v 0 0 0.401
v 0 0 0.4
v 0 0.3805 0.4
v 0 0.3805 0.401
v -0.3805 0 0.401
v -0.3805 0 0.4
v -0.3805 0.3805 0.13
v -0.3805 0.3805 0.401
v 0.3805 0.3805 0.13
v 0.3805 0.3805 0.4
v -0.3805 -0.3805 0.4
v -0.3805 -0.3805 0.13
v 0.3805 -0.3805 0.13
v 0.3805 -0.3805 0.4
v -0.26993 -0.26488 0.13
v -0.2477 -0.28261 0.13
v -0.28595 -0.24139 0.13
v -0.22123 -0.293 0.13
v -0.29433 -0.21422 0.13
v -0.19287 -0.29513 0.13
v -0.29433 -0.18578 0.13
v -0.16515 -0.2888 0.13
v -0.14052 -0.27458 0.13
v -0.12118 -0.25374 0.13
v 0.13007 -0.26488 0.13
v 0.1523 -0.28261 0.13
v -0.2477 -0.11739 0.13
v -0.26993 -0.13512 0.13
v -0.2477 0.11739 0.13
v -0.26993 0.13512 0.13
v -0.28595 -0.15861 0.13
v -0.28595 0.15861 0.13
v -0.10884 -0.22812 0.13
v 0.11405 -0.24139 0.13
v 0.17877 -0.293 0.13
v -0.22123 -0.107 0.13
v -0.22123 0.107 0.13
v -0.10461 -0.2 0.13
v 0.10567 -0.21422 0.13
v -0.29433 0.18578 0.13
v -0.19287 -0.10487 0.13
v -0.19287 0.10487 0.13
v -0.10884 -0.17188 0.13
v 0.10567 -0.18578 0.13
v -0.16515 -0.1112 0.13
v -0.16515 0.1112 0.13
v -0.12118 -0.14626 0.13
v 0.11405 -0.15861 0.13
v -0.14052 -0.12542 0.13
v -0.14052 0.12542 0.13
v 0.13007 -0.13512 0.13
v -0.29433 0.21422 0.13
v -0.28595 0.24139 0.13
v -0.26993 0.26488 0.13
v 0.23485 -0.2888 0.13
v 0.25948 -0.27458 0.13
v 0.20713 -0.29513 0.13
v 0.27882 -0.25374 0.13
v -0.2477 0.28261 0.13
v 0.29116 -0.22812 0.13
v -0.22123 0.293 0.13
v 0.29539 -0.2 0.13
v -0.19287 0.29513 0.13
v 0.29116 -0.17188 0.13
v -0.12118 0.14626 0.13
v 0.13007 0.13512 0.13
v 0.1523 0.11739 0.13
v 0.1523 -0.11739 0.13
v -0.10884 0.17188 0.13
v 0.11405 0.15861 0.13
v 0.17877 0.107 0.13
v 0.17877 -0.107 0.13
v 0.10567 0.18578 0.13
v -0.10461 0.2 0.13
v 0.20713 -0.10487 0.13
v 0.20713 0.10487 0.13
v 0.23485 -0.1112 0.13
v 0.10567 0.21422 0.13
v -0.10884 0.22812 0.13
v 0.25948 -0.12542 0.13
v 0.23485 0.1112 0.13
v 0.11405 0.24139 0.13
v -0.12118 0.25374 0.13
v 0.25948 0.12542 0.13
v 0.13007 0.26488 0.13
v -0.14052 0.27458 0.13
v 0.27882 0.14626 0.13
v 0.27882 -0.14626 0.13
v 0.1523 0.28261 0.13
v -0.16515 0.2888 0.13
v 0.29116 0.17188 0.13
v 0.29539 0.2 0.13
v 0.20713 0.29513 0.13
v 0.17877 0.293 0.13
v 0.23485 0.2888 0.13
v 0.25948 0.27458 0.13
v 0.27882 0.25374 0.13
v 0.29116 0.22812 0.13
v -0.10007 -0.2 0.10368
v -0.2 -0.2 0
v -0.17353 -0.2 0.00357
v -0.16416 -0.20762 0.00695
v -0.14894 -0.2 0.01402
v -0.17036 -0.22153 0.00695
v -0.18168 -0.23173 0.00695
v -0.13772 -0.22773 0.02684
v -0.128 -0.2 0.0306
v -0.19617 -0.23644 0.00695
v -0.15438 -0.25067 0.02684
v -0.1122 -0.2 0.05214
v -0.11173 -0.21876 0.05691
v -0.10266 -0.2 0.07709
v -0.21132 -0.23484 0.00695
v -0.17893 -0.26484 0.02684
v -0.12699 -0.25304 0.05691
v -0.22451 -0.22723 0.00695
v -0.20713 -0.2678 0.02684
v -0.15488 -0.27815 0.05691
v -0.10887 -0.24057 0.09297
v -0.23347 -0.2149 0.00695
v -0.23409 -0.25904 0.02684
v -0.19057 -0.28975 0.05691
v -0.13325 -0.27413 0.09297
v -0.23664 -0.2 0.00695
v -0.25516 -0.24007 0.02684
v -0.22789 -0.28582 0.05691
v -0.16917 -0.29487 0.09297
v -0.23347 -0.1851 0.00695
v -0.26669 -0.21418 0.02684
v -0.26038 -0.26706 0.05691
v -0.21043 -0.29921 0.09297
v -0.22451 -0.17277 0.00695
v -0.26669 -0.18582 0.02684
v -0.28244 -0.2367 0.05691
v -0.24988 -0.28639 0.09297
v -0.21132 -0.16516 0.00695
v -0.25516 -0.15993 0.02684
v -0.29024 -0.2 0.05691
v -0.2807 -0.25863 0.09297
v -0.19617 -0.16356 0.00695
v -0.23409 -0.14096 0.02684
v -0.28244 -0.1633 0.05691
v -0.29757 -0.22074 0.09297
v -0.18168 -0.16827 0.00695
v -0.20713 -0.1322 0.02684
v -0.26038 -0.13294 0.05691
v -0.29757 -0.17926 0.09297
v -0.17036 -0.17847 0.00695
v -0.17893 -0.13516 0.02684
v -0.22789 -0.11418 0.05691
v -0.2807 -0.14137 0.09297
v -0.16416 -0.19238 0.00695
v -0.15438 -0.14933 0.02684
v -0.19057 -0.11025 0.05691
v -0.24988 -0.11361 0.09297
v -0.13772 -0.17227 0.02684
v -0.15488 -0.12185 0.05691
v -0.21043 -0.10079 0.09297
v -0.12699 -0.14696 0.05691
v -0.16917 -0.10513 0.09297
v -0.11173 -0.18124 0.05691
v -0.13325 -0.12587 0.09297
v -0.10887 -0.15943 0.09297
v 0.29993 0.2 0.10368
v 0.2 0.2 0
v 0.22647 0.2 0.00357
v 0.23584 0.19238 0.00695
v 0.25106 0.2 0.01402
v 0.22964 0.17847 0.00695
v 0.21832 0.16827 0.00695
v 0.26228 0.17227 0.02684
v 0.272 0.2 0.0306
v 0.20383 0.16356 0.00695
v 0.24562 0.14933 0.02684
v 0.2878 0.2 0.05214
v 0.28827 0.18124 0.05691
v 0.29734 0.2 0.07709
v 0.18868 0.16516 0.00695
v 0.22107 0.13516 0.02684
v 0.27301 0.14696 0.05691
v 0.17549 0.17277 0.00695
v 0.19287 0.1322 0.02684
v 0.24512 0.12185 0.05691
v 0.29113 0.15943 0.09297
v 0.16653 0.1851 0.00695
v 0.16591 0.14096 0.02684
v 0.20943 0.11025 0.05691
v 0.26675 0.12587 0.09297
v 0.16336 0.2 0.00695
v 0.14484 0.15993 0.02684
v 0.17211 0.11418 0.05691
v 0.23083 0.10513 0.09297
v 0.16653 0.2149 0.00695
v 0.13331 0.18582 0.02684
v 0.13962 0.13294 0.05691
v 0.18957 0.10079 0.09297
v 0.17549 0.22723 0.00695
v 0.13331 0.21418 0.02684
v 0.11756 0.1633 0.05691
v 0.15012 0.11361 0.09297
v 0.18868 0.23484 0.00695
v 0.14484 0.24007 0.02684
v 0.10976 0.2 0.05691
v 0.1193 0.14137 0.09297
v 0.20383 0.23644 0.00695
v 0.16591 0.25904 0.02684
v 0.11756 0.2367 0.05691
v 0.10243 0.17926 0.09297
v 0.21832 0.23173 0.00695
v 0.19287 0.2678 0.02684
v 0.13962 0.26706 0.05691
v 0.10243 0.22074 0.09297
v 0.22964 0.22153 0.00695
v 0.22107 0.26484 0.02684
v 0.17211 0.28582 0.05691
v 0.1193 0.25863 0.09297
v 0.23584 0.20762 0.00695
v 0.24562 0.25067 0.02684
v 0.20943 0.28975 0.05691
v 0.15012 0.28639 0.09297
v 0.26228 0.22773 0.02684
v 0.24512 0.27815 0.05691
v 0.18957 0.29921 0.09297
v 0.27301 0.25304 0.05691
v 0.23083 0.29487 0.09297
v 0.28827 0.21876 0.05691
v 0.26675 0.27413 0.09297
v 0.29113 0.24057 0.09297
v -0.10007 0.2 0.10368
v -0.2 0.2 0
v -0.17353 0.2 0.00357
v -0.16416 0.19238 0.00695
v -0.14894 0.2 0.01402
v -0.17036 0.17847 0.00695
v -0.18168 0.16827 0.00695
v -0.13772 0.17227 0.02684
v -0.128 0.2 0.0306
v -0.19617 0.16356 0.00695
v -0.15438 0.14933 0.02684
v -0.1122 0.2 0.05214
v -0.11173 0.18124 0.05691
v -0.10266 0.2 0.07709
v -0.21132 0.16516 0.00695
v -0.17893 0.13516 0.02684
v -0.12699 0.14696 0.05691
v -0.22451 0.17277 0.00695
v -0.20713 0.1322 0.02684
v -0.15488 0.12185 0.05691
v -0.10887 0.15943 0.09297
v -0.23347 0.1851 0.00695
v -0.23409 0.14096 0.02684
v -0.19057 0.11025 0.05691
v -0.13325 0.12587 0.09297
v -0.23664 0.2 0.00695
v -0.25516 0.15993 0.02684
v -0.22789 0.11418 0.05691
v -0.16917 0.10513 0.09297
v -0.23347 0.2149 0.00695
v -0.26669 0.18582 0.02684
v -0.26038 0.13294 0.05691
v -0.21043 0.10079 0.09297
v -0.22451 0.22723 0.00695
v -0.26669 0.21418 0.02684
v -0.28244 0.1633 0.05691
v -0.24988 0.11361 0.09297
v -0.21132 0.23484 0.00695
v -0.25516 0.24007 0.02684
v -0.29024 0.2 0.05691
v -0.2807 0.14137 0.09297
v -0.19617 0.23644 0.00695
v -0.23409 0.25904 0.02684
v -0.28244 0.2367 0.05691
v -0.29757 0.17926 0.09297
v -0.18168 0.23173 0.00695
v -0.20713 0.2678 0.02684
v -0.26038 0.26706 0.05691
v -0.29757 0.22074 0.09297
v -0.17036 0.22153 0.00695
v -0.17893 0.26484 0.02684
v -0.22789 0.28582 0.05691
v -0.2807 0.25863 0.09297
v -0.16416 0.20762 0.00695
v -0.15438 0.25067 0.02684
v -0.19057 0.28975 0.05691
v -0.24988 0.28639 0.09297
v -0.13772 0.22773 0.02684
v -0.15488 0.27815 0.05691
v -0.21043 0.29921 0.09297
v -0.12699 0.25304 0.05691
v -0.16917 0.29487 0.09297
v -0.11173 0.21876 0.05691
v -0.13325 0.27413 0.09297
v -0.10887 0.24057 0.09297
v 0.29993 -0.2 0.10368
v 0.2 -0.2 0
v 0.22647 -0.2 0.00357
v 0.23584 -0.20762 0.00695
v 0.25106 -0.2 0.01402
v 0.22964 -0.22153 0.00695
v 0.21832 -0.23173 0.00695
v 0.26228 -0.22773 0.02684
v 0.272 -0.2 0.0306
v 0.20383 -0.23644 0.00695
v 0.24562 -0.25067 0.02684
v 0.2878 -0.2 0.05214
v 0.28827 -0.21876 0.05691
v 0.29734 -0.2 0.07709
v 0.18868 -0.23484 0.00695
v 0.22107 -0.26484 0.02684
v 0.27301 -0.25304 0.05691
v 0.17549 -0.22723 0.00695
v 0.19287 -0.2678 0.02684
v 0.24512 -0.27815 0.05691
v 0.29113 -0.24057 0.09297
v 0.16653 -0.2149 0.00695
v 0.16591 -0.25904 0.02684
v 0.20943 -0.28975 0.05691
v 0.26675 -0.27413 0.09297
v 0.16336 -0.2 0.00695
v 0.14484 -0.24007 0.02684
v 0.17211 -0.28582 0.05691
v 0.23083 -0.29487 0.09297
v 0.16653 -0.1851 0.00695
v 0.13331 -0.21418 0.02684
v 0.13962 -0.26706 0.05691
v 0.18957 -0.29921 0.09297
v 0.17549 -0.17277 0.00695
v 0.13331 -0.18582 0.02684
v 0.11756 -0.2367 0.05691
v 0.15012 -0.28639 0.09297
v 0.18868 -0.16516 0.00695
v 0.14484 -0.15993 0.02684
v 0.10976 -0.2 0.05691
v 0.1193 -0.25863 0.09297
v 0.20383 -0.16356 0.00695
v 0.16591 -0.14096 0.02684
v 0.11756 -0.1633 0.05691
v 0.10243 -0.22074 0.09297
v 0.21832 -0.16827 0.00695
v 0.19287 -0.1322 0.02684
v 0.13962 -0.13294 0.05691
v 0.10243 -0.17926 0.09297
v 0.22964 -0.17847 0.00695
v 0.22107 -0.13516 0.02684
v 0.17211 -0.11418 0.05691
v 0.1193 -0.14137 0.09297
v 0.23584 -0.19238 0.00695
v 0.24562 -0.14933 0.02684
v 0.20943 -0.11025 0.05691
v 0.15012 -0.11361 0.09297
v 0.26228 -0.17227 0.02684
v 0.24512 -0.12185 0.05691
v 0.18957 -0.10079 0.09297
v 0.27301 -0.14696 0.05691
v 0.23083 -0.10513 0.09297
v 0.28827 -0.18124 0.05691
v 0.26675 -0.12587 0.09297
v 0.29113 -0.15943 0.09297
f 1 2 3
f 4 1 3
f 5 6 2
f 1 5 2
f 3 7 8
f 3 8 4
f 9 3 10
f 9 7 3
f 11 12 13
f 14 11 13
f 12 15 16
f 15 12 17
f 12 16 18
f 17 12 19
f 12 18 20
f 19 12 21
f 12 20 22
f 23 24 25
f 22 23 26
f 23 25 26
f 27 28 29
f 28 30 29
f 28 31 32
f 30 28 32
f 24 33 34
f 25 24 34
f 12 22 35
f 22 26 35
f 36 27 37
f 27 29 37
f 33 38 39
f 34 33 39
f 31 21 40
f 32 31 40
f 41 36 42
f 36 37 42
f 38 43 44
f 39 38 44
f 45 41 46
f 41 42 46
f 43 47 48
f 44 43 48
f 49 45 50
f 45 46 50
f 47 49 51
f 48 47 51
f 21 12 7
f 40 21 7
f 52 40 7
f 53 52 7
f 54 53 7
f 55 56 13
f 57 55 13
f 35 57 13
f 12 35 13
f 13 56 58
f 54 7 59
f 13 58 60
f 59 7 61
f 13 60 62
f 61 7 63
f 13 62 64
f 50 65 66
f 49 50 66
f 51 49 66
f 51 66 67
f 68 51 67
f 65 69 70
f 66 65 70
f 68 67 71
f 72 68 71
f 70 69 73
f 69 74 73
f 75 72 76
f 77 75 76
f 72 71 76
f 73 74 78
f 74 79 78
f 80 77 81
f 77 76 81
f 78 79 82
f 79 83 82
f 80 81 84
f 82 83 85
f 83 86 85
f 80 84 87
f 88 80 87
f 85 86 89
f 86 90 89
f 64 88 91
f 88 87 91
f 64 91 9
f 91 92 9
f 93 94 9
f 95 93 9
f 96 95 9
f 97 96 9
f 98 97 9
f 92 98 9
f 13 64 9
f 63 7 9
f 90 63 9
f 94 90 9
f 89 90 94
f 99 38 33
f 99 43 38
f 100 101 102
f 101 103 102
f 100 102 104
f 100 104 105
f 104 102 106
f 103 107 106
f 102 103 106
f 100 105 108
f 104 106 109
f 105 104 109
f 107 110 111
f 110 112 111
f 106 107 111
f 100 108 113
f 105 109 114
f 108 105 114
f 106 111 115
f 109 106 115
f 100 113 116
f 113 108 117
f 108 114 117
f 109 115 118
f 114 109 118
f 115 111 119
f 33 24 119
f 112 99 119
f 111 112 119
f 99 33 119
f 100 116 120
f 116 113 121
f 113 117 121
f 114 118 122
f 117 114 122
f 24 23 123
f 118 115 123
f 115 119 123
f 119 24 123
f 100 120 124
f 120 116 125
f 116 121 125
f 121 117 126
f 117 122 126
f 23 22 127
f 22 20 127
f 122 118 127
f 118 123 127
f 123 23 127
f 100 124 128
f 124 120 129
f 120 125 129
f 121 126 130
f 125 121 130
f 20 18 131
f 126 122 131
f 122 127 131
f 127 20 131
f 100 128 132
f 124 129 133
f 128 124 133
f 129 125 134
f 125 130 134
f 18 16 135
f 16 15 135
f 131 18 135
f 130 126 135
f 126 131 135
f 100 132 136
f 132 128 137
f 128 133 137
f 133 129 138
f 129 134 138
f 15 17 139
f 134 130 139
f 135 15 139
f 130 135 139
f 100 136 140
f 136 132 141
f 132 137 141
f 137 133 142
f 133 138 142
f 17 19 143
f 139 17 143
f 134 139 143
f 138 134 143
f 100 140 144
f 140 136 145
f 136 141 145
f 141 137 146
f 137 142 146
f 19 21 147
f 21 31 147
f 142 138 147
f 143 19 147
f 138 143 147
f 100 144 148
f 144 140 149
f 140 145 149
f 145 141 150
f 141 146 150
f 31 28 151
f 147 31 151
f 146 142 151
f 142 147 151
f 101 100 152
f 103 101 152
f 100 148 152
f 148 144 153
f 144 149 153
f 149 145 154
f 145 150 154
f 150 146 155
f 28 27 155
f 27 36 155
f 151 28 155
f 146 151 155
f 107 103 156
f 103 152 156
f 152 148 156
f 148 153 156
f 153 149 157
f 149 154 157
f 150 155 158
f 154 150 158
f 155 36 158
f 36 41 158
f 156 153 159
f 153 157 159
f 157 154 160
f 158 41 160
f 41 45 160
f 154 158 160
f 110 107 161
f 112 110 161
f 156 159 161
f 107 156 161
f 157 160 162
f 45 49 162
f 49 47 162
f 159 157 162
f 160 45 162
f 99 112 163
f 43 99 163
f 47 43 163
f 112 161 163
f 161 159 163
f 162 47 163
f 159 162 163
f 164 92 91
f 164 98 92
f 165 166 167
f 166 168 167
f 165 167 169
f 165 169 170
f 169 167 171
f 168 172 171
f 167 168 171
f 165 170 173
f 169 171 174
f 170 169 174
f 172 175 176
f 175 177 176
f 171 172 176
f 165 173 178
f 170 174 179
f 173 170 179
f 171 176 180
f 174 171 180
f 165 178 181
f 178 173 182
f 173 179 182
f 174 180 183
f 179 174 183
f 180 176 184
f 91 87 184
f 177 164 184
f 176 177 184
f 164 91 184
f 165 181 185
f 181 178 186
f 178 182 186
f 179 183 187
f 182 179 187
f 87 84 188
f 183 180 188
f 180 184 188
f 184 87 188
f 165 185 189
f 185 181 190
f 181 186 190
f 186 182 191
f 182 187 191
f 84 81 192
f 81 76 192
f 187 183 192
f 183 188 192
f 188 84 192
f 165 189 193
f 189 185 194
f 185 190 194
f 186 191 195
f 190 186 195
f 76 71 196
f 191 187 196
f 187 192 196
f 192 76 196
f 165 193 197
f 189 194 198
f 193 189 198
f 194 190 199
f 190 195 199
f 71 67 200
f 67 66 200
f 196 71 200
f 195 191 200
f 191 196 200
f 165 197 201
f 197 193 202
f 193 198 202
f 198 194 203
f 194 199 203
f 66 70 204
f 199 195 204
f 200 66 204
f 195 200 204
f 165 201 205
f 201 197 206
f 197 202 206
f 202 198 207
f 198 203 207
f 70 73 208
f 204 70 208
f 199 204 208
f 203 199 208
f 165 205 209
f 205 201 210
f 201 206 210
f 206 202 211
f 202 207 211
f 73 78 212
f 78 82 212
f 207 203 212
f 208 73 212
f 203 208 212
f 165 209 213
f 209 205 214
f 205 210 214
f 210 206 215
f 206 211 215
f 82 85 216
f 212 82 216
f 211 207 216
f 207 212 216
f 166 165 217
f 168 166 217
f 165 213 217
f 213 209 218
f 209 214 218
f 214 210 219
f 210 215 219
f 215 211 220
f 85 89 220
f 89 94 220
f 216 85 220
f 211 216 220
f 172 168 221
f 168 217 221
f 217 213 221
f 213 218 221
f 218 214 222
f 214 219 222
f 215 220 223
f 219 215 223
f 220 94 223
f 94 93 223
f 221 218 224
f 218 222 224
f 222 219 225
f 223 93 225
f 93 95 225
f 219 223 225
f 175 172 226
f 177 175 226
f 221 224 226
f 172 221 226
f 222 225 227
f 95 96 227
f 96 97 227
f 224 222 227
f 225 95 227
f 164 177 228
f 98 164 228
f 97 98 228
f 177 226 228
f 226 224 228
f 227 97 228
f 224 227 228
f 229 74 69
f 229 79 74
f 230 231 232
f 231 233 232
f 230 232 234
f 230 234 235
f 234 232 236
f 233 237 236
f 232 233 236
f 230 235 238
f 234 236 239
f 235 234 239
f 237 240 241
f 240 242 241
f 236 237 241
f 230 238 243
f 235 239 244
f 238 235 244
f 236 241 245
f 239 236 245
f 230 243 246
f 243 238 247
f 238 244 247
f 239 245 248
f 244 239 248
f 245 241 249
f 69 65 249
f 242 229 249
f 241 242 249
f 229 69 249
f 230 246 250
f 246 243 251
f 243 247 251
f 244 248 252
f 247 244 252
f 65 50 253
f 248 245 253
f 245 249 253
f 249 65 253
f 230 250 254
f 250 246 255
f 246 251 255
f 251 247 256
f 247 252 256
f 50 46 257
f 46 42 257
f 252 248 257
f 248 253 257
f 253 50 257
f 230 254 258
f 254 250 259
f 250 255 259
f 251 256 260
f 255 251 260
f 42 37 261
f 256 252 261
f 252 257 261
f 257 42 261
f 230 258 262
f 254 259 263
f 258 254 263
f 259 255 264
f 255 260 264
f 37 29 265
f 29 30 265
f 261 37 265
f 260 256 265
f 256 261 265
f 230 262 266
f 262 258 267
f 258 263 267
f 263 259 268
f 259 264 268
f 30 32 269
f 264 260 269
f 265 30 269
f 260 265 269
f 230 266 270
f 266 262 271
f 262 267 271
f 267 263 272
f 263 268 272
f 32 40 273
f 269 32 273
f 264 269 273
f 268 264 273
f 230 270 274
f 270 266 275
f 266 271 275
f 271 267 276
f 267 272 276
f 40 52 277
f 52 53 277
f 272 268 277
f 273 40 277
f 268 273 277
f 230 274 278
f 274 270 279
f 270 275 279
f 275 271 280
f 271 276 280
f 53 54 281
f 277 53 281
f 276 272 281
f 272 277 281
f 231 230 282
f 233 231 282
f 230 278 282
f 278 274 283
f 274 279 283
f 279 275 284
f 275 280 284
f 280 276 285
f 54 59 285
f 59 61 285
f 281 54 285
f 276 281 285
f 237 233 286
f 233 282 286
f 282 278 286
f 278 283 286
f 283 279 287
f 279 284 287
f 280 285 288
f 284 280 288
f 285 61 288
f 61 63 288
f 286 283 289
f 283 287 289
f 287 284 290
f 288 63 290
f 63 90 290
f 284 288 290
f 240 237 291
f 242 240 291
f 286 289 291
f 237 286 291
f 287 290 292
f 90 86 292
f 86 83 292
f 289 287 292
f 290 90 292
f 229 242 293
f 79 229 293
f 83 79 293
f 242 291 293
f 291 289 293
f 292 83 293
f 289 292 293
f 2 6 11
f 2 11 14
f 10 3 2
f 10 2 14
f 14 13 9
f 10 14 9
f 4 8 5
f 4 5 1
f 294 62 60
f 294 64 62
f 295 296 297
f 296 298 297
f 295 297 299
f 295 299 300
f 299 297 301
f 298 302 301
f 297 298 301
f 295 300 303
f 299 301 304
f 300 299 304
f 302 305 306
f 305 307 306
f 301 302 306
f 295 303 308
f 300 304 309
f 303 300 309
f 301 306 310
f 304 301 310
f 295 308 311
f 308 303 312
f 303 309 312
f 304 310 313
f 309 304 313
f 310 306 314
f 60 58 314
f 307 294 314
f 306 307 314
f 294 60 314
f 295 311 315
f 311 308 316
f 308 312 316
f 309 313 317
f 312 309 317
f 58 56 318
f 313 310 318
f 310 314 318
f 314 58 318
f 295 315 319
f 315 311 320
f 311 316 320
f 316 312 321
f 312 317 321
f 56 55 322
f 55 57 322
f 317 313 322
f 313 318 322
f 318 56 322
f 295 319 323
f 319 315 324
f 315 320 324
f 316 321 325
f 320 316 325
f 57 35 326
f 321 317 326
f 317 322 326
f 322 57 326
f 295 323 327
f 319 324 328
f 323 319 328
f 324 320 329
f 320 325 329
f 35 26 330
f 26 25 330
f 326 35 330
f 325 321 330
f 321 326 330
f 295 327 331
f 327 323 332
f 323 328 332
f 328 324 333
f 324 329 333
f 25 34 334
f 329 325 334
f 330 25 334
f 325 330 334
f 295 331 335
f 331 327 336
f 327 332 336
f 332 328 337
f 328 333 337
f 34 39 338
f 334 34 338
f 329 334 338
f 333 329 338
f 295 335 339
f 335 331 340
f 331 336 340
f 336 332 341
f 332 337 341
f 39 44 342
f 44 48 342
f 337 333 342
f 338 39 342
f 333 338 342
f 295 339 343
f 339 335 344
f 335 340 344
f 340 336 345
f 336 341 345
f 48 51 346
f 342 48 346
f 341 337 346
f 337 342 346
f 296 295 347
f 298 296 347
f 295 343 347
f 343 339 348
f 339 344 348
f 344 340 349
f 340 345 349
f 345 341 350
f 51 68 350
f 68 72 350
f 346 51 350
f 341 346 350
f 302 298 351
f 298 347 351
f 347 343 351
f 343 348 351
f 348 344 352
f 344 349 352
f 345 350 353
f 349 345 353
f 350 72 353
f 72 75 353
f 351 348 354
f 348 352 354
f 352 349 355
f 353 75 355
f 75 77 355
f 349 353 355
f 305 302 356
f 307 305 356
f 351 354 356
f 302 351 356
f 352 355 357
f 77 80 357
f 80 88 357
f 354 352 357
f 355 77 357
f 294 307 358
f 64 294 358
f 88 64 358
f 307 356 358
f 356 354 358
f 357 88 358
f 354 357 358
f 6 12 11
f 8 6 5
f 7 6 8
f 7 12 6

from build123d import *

# Parameters (mm, degrees)
SKETCH1_W            = 0.761
SKETCH1_H            = 0.761
BOSS_EXTRUDE1_DEPTH  = 0.27
SKETCH2_W            = 0.3805
SKETCH2_H            = 0.3805
BOSS_EXTRUDE2_DEPTH  = 0.001
LPATTERN1_COUNT      = 2
LPATTERN1_PITCH      = 0.4
LPATTERN1_COUNT_DIR2 = 2
LPATTERN1_PITCH_DIR2 = 0.4


with BuildPart() as part:
    # Sketch1 → Boss-Extrude1 (new body)
    with BuildSketch(Plane.XY.offset(0.13)):
        Rectangle(SKETCH1_W, SKETCH1_H)
    extrude(amount=BOSS_EXTRUDE1_DEPTH)

    # Sketch2 → Boss-Extrude2 (add)
    with BuildSketch(Plane.XY.offset(0.4)):
        with Locations((-0.19025, 0.19025)):
            Rectangle(SKETCH2_W, SKETCH2_H)
    extrude(amount=BOSS_EXTRUDE2_DEPTH)

    # Sketch3 → Revolve1 (revolve)
    with BuildSketch(Plane(origin=(0, 0.2, 0), x_dir=(1, 0, 0), z_dir=(0, 1, 0))):
        with BuildLine():
            Line((0.2, -0.13), (0.2, 0))
            ThreePointArc((0.2, 0), (0.280622577, -0.040839202), (0.29539392, -0.13))
            Line((0.29539392, -0.13), (0.2, -0.13))
        make_face()
    revolve1 = revolve(axis=Axis((0.2, 0.2, 0.13), (0, 0, -1)))

    # LPattern1: Revolve1 2 × 2
    with Locations(*[(-i * LPATTERN1_PITCH, -j * LPATTERN1_PITCH_DIR2, 0) for i in range(LPATTERN1_COUNT) for j in range(LPATTERN1_COUNT_DIR2) if (i, j) != (0, 0)]):
        add(revolve1)


solid = part.part
